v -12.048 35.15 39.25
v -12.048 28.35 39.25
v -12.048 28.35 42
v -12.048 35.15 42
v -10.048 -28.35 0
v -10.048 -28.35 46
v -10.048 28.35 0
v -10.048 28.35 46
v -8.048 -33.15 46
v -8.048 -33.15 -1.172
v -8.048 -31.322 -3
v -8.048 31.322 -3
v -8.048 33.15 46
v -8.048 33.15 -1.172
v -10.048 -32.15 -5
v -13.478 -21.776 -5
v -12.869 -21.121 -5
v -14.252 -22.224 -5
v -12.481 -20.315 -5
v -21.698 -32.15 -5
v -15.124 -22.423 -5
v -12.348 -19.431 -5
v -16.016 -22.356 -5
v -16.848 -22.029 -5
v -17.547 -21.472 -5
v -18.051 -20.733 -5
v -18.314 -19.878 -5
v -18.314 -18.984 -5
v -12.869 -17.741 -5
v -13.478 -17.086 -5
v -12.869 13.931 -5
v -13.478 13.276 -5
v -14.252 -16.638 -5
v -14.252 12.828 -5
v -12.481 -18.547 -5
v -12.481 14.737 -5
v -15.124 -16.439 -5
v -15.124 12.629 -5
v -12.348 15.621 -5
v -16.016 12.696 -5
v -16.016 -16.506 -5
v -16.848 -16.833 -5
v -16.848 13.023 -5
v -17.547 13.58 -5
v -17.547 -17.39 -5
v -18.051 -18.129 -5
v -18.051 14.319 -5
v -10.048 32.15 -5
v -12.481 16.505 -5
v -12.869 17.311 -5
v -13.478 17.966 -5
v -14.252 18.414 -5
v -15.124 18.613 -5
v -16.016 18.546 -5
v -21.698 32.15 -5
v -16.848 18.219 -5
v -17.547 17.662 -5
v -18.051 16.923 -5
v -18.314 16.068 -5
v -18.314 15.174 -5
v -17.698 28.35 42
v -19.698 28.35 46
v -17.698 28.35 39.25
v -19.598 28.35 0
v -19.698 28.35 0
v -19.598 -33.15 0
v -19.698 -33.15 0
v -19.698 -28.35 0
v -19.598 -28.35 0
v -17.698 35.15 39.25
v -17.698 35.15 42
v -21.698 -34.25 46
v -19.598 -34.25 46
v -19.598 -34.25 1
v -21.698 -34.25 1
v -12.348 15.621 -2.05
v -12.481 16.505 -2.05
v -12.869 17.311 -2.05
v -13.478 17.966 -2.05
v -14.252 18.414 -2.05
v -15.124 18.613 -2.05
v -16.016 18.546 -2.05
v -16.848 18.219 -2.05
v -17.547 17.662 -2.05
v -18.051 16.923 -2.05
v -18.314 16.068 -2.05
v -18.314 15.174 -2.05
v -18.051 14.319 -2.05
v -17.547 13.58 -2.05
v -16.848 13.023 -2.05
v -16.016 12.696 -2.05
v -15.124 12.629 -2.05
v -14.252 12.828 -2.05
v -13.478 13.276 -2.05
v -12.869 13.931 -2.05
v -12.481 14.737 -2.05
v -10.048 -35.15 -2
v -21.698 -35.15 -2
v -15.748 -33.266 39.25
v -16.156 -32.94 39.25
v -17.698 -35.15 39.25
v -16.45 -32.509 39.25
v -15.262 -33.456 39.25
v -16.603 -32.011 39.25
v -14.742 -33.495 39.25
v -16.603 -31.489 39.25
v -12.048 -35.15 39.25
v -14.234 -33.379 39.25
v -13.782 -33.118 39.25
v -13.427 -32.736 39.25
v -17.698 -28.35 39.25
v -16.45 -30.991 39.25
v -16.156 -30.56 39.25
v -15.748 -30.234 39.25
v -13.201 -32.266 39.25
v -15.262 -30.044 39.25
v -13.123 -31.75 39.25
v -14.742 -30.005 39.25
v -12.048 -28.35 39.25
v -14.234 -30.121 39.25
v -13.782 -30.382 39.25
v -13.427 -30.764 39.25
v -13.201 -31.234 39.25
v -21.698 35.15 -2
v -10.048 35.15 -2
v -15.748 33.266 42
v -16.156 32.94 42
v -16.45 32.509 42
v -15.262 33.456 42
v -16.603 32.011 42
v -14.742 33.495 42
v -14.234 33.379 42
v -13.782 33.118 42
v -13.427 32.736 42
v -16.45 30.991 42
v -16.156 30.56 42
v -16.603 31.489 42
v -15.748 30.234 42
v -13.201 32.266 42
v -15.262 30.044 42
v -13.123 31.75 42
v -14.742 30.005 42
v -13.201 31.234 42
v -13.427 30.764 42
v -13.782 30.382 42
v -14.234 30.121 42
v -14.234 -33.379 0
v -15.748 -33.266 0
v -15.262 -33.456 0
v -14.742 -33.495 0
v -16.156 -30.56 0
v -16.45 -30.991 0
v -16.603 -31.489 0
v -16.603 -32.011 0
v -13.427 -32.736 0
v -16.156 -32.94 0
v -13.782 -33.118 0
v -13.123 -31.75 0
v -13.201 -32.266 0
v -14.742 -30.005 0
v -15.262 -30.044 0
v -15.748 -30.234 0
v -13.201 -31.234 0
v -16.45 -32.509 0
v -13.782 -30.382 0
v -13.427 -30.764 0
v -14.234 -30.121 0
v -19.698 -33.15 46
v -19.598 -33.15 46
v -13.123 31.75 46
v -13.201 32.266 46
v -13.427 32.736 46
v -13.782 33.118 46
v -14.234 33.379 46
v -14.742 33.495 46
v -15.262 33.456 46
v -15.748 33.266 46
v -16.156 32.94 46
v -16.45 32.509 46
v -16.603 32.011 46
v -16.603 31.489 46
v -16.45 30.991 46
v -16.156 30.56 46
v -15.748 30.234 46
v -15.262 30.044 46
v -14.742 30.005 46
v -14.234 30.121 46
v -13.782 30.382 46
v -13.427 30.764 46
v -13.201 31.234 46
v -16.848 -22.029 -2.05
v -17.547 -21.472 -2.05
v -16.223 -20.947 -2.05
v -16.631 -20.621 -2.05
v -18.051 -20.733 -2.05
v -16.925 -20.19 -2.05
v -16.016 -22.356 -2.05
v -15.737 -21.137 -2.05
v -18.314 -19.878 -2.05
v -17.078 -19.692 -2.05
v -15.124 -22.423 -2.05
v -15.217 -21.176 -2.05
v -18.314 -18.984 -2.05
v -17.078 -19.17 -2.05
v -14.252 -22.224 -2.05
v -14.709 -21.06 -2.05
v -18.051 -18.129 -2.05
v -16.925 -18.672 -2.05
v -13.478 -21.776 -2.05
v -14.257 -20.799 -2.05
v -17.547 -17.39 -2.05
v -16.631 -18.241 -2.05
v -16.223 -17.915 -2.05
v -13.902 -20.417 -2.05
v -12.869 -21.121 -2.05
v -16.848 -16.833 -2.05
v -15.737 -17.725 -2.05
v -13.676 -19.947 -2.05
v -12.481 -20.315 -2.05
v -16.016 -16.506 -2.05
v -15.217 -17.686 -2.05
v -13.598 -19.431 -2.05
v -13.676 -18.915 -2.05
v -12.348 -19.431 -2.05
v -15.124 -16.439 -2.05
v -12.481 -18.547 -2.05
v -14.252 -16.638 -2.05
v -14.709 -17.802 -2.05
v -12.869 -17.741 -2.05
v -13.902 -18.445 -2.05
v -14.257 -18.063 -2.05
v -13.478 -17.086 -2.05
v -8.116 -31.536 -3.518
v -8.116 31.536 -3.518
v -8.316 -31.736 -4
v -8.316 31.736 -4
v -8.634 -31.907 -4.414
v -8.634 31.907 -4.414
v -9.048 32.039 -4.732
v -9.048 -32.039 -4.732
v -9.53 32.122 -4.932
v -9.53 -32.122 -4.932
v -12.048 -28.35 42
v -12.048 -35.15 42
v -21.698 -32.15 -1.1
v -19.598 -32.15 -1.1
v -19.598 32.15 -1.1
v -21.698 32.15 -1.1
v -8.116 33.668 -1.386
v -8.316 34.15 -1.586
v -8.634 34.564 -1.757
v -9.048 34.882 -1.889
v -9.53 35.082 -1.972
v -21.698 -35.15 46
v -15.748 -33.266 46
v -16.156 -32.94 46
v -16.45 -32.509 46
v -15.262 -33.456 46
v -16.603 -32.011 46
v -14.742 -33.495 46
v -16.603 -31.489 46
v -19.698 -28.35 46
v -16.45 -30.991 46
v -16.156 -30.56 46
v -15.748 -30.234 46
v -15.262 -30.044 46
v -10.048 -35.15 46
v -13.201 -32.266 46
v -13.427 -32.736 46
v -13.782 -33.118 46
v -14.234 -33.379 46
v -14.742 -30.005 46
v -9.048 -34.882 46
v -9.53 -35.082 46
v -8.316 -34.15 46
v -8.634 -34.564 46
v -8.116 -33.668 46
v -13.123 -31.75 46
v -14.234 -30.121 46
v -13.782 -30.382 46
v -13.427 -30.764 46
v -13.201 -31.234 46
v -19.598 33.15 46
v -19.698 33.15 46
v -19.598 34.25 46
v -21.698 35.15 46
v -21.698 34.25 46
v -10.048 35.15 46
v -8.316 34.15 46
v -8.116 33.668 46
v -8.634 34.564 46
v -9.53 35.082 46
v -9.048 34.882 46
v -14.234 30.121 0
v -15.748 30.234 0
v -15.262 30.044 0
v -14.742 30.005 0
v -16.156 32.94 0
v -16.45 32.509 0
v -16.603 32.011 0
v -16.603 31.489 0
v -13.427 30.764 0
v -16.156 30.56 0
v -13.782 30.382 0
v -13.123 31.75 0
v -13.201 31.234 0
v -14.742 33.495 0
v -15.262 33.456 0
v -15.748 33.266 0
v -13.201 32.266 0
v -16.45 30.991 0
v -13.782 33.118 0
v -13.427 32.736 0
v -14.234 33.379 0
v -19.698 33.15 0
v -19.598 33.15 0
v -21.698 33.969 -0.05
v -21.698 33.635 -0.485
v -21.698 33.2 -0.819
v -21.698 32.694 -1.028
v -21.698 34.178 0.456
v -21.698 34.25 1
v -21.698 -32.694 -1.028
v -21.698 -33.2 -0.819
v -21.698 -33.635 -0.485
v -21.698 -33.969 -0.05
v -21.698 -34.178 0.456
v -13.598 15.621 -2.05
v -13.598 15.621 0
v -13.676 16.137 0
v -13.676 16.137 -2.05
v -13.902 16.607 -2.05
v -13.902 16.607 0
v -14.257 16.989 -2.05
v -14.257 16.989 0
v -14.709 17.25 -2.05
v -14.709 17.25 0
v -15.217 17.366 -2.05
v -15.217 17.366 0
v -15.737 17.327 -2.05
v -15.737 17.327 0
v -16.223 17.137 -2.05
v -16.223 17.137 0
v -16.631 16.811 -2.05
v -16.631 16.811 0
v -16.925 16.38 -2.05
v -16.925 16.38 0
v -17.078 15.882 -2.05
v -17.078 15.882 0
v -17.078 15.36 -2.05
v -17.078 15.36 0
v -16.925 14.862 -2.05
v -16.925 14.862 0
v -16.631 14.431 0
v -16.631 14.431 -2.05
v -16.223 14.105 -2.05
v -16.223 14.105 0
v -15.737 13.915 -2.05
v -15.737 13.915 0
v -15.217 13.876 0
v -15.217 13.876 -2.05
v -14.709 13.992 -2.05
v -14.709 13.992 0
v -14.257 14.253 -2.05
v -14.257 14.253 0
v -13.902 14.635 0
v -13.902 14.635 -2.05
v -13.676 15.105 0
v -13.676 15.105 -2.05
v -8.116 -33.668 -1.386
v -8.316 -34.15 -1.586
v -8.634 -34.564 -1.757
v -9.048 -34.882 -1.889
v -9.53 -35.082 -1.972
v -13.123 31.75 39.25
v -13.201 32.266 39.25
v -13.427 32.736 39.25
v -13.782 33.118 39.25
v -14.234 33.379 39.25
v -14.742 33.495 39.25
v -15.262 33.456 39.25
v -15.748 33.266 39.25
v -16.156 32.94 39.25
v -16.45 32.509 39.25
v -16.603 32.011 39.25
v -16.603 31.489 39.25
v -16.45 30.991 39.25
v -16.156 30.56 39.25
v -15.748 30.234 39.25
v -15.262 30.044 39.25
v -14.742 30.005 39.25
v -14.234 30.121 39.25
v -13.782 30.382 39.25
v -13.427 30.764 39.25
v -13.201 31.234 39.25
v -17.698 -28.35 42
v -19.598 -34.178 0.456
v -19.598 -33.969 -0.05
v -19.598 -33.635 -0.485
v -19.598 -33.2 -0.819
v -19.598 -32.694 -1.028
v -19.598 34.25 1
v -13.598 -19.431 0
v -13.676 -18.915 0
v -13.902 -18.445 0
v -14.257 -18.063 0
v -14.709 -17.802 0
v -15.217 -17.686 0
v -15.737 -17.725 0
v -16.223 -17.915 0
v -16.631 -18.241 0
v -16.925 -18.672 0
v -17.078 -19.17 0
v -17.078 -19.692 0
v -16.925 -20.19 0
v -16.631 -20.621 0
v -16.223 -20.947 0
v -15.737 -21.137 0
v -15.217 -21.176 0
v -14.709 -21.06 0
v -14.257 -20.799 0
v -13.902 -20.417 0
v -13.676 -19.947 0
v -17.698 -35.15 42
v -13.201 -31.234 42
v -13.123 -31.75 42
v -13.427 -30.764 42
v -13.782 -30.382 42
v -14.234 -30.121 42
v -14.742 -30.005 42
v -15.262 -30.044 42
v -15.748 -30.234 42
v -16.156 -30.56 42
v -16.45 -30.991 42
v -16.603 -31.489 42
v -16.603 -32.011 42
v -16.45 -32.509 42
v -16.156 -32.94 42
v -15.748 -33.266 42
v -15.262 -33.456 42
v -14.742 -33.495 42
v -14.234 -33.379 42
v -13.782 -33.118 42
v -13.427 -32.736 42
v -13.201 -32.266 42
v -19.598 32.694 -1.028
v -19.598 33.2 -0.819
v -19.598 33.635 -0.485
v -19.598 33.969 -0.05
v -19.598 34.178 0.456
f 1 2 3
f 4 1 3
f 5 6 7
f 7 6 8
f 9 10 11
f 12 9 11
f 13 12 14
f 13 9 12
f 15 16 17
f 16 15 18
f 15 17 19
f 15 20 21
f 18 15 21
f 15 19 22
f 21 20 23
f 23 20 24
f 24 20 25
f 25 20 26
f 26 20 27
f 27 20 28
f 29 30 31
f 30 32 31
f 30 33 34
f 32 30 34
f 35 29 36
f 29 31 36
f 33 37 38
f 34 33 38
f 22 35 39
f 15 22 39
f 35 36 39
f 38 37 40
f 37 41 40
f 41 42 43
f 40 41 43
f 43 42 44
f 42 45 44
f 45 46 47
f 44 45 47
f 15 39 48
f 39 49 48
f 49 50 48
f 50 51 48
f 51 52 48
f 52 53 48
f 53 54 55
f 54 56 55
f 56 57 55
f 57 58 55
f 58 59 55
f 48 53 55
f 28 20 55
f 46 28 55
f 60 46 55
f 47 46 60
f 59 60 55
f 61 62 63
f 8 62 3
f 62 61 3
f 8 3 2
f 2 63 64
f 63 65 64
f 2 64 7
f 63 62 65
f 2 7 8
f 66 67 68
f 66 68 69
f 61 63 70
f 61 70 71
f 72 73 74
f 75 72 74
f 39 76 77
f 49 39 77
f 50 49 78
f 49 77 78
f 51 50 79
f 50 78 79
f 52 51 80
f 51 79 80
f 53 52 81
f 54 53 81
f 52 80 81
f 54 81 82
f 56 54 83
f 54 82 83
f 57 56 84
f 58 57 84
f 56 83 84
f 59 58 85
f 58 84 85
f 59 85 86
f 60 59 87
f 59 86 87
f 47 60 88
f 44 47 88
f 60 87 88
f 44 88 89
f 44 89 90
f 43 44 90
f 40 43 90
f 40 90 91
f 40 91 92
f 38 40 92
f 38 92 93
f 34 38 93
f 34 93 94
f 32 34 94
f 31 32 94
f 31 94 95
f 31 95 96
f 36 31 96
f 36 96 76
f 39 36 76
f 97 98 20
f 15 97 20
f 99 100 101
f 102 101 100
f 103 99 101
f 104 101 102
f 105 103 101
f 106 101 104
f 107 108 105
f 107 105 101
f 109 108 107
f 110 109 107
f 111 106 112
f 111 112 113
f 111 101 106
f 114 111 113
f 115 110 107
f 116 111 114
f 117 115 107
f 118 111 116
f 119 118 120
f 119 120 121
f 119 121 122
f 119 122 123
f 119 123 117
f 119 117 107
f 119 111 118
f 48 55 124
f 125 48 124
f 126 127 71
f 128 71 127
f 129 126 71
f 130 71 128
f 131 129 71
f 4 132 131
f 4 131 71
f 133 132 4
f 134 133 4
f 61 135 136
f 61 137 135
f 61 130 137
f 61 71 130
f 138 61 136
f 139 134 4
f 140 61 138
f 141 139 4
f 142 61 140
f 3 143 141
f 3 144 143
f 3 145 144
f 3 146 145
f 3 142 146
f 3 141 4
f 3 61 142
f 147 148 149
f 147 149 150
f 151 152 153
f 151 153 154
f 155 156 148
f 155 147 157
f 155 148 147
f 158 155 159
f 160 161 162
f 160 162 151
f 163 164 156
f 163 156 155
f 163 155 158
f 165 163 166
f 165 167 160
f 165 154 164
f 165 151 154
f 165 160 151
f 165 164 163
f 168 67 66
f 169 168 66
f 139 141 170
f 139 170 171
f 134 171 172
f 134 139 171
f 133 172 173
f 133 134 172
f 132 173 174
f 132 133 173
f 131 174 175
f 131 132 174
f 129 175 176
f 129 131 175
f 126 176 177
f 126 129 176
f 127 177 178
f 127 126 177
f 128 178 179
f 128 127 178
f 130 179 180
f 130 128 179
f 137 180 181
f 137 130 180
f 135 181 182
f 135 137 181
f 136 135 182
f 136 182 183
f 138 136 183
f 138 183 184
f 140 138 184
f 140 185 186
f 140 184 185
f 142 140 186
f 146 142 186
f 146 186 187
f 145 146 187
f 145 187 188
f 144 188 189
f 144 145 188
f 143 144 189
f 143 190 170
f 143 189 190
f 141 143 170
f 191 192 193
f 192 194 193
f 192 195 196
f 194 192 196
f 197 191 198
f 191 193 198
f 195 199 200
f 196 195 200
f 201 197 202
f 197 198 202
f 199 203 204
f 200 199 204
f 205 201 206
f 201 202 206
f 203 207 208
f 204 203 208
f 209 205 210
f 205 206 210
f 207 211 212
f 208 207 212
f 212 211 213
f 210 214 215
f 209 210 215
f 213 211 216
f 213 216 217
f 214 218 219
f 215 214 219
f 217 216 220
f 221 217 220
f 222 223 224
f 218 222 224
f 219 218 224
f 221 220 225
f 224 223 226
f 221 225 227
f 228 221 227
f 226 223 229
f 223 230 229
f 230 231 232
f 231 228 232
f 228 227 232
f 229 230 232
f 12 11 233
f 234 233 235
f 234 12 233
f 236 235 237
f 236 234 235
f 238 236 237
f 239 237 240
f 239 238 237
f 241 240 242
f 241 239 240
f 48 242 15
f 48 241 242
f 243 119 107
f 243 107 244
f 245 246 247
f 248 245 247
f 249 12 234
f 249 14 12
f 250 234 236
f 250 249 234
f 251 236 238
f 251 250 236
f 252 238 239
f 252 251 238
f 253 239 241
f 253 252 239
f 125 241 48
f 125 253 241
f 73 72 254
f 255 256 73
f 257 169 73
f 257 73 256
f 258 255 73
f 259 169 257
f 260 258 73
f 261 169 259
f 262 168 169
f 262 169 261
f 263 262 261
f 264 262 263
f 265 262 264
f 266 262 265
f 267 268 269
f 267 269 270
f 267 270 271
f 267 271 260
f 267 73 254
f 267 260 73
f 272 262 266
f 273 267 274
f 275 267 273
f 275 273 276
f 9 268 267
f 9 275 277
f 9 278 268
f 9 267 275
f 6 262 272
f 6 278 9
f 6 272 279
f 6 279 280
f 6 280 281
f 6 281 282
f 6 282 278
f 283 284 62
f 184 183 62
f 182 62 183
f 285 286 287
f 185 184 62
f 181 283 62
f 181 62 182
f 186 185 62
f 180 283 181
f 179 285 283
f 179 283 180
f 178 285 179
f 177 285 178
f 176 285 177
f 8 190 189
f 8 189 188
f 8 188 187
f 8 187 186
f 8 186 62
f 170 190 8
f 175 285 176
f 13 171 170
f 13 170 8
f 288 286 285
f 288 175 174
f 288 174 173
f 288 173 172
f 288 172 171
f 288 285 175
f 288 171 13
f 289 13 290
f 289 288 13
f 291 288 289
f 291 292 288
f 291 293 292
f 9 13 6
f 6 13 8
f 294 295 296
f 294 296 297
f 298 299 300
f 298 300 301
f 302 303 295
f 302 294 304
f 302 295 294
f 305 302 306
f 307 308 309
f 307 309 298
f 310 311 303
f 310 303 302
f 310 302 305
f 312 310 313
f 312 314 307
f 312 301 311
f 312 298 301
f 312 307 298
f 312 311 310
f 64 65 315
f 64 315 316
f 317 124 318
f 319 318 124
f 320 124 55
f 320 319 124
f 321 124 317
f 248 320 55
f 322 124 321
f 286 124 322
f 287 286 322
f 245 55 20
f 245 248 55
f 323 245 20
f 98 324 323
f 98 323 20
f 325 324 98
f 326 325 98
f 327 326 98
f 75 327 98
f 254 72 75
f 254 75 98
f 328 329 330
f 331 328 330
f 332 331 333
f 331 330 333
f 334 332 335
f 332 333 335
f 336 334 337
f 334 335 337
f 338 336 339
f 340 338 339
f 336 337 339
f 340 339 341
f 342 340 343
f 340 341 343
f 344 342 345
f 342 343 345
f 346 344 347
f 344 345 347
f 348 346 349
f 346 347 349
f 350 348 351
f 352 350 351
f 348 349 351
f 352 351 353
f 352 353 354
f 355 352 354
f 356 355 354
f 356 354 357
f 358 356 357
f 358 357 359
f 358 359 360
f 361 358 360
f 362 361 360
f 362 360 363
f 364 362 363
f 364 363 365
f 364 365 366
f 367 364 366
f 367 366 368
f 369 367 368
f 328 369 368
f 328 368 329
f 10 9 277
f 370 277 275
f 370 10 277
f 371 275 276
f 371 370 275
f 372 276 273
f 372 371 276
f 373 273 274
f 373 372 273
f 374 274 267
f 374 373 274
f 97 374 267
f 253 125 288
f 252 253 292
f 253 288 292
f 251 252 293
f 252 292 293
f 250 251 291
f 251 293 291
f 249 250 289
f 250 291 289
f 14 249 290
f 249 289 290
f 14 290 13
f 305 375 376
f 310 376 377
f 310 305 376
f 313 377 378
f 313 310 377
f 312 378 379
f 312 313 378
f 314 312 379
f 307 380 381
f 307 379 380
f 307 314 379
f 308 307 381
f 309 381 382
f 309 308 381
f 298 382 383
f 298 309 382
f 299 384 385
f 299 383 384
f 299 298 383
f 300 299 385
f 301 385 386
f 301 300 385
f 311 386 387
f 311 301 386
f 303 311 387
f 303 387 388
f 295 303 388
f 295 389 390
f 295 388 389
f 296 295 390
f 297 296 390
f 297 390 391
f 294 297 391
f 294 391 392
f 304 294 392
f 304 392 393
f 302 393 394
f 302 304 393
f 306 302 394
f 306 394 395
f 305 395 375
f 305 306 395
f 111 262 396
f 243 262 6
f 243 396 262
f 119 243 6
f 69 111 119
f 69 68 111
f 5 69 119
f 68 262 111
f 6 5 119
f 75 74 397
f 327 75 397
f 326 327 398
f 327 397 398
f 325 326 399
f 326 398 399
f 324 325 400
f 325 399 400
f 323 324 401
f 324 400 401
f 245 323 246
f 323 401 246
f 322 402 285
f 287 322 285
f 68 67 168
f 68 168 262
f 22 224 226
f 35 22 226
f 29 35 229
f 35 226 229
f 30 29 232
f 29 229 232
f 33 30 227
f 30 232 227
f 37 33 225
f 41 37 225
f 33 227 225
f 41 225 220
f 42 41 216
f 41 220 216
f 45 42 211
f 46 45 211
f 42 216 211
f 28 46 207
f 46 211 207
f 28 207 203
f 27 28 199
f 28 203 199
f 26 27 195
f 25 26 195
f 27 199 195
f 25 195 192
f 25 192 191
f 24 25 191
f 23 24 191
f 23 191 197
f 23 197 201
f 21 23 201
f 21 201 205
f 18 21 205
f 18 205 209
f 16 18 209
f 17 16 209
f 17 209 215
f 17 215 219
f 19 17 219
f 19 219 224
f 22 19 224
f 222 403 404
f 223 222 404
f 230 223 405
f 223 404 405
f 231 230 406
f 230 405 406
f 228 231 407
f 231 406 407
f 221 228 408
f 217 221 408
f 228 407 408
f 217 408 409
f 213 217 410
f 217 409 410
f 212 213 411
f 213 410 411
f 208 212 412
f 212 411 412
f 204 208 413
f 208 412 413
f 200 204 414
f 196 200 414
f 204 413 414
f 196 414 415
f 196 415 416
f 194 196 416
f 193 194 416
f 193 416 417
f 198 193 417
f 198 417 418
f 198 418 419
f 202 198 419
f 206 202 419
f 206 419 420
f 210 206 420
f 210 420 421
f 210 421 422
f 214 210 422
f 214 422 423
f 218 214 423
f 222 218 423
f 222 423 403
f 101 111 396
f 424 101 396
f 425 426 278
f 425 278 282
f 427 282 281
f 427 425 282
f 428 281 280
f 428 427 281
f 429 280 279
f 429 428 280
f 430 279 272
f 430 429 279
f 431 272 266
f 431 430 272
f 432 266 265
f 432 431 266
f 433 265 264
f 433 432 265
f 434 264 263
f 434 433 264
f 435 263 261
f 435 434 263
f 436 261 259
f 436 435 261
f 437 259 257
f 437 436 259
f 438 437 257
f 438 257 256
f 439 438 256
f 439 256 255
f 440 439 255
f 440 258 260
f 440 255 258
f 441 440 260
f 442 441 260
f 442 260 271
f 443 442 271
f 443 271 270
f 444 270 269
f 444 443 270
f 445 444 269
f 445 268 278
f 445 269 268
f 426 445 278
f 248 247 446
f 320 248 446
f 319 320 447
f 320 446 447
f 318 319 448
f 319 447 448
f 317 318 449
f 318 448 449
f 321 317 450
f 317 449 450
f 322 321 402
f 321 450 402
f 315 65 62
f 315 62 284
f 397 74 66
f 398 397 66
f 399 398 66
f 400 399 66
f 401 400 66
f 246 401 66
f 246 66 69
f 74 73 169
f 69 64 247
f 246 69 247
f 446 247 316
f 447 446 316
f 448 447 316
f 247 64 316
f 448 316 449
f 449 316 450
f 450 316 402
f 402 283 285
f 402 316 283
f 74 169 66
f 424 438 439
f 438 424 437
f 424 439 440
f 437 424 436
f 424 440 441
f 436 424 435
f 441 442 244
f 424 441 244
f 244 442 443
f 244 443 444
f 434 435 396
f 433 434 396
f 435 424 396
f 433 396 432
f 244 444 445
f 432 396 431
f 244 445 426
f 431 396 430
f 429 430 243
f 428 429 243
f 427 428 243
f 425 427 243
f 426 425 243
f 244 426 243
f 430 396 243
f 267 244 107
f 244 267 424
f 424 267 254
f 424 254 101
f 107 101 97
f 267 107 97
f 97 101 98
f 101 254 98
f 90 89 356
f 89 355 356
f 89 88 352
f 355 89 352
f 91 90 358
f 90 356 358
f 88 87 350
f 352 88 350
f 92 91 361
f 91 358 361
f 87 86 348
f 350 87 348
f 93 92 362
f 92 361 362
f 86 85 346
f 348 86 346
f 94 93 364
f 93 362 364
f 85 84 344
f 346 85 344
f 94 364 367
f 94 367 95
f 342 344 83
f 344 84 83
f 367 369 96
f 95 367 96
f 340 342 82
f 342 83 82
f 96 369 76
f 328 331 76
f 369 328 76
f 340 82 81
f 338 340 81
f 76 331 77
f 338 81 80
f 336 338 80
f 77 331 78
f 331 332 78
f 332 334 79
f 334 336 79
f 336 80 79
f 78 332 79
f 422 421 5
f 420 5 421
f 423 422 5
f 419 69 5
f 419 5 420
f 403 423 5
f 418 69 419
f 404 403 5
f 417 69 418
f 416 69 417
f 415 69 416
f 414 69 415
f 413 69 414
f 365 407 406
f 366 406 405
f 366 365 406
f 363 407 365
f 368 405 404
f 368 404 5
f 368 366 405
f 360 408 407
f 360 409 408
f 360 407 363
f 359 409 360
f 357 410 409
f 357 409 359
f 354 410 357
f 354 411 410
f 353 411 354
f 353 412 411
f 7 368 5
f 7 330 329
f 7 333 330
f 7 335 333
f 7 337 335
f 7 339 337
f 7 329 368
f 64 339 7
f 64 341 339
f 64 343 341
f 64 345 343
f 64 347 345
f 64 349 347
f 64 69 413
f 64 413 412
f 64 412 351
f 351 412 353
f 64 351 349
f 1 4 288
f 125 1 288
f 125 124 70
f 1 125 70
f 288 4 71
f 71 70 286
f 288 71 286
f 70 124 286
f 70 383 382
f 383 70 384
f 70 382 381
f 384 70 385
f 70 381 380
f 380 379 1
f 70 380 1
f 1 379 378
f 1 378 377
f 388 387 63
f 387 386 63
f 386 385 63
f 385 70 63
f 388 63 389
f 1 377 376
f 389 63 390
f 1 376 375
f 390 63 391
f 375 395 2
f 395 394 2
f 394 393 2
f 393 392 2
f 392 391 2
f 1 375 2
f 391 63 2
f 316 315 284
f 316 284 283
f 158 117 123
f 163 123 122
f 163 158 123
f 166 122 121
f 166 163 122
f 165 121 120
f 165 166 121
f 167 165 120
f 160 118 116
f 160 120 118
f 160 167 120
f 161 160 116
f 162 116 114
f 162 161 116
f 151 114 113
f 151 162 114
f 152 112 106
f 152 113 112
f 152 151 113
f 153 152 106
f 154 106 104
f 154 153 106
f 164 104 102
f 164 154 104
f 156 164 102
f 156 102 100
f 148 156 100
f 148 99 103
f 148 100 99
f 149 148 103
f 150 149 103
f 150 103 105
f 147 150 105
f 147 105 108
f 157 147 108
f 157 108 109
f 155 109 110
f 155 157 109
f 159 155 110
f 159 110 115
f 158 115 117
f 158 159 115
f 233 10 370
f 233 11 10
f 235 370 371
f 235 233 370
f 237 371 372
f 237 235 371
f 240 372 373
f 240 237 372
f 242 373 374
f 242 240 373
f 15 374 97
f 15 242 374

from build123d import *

# Parameters (mm, degrees)
PAD039_DEPTH         = 11.65
POCKET045_DEPTH      = 2.101
PAD_DEPTH            = 2
SKETCH117_W          = 9.65
SKETCH117_H          = 4.8
PAD041_DEPTH         = 46
SKETCH120_R          = 1.75
POCKET048_DEPTH      = 46.001
SKETCH115_R          = 1.75
POCKET046_DEPTH      = 5.001
SKETCH116_R          = 3
POCKET047_DEPTH      = 2.951
SKETCH118_W          = 5.65
SKETCH118_H          = 2.75
POCKET049_DEPTH      = 35.151
POCKET049_DEPTH_BACK = 35.151
FILLET_R             = 2


with BuildPart() as part:
    # Sketch119 → Pad039 (new body)
    with BuildSketch(Plane.YZ.offset(-21.698)):
        with BuildLine():
            ThreePointArc((-33.15, 1), (-32.857107, 0.292893), (-32.15, 0))
            Line((-32.15, 0), (32.15, 0))
            ThreePointArc((32.15, 0), (32.857107, 0.292893), (33.15, 1))
            Line((33.15, 46), (33.15, 1))
            Line((33.15, 46), (35.15, 46))
            Line((35.15, 46), (35.15, -2))
            Line((35.15, -2), (32.15, -5))
            Line((32.15, -5), (-32.15, -5))
            Line((-32.15, -5), (-35.15, -2))
            Line((-35.15, -2), (-35.15, 46))
            Line((-35.15, 46), (-33.15, 46))
            Line((-33.15, 46), (-33.15, 1))
        make_face()
    extrude(amount=PAD039_DEPTH)

    # Sketch114 → Pocket045 (cut, through all)
    with BuildSketch(Plane.YZ.offset(-19.598)):
        with BuildLine():
            Line((-34.25, 46), (-34.25, 1))
            ThreePointArc((-34.25, 1), (-33.634924, -0.484924), (-32.15, -1.1))
            Line((-32.15, -1.1), (32.15, -1.1))
            ThreePointArc((32.15, -1.1), (33.634924, -0.484924), (34.25, 1))
            Line((34.25, 1), (34.25, 46))
            Line((34.25, 46), (33.15, 46))
            Line((33.15, 46), (33.15, 1))
            ThreePointArc((32.15, 0), (32.857107, 0.292893), (33.15, 1))
            Line((-32.15, 0), (32.15, 0))
            ThreePointArc((-33.15, 1), (-32.857107, 0.292893), (-32.15, 0))
            Line((-33.15, 46), (-33.15, 1))
            Line((-34.25, 46), (-33.15, 46))
        make_face()
    extrude(amount=-POCKET045_DEPTH, mode=Mode.SUBTRACT)

    # Sketch123 → Pad (join)
    with BuildSketch(Plane.YZ.offset(-10.048)):
        Polygon((-35.15, 46), (-35.15, -2), (-32.15, -5), (32.15, -5), (35.15, -2), (35.15, 46), align=None)
    extrude(amount=PAD_DEPTH)

    # Sketch117 → Pad041 (join)
    with BuildSketch(Plane.XY):
        with Locations((-14.873, 30.75)):
            Rectangle(SKETCH117_W, SKETCH117_H)
        with Locations((-14.873, -30.75)):
            Rectangle(SKETCH117_W, SKETCH117_H)
    extrude(amount=PAD041_DEPTH)

    # Sketch120 → Pocket048 (cut, through all)
    with BuildSketch(Plane.XY):
        with Locations((-14.873, 31.75)):
            Circle(SKETCH120_R)
        with Locations((-14.873, -31.75)):
            Circle(SKETCH120_R)
    extrude(amount=POCKET048_DEPTH, mode=Mode.SUBTRACT)

    # Sketch115 → Pocket046 (cut, through all)
    with BuildSketch(Plane.XY):
        with Locations((-15.348, 15.621)):
            Circle(SKETCH115_R)
        with Locations((-15.348, -19.431)):
            Circle(SKETCH115_R)
    extrude(amount=-POCKET046_DEPTH, mode=Mode.SUBTRACT)

    # Sketch116 → Pocket047 (cut, through all)
    with BuildSketch(Plane.XY.offset(-2.05)):
        with Locations((-15.348, 15.621)):
            Circle(SKETCH116_R)
        with Locations((-15.348, -19.431)):
            Circle(SKETCH116_R)
    extrude(amount=-POCKET047_DEPTH, mode=Mode.SUBTRACT)

    # Sketch118 → Pocket049 (cut, two sides)
    with BuildSketch(Plane.XZ) as pocket049_sk:
        with Locations((-14.873, 40.625)):
            Rectangle(SKETCH118_W, SKETCH118_H)
    extrude(amount=-POCKET049_DEPTH, mode=Mode.SUBTRACT)
    extrude(pocket049_sk.sketch, amount=POCKET049_DEPTH_BACK, mode=Mode.SUBTRACT)

    # Fillet
    fillet_edges = [part.edges().sort_by_distance(p)[0] for p in [
        (-8.048, -35.15, 22),
        (-8.048, -33.65, -3.5),
        (-8.048, 0, -5),
        (-8.048, 33.65, -3.5),
        (-8.048, 35.15, 22),
    ]]
    fillet(fillet_edges, radius=FILLET_R)


solid = part.part
